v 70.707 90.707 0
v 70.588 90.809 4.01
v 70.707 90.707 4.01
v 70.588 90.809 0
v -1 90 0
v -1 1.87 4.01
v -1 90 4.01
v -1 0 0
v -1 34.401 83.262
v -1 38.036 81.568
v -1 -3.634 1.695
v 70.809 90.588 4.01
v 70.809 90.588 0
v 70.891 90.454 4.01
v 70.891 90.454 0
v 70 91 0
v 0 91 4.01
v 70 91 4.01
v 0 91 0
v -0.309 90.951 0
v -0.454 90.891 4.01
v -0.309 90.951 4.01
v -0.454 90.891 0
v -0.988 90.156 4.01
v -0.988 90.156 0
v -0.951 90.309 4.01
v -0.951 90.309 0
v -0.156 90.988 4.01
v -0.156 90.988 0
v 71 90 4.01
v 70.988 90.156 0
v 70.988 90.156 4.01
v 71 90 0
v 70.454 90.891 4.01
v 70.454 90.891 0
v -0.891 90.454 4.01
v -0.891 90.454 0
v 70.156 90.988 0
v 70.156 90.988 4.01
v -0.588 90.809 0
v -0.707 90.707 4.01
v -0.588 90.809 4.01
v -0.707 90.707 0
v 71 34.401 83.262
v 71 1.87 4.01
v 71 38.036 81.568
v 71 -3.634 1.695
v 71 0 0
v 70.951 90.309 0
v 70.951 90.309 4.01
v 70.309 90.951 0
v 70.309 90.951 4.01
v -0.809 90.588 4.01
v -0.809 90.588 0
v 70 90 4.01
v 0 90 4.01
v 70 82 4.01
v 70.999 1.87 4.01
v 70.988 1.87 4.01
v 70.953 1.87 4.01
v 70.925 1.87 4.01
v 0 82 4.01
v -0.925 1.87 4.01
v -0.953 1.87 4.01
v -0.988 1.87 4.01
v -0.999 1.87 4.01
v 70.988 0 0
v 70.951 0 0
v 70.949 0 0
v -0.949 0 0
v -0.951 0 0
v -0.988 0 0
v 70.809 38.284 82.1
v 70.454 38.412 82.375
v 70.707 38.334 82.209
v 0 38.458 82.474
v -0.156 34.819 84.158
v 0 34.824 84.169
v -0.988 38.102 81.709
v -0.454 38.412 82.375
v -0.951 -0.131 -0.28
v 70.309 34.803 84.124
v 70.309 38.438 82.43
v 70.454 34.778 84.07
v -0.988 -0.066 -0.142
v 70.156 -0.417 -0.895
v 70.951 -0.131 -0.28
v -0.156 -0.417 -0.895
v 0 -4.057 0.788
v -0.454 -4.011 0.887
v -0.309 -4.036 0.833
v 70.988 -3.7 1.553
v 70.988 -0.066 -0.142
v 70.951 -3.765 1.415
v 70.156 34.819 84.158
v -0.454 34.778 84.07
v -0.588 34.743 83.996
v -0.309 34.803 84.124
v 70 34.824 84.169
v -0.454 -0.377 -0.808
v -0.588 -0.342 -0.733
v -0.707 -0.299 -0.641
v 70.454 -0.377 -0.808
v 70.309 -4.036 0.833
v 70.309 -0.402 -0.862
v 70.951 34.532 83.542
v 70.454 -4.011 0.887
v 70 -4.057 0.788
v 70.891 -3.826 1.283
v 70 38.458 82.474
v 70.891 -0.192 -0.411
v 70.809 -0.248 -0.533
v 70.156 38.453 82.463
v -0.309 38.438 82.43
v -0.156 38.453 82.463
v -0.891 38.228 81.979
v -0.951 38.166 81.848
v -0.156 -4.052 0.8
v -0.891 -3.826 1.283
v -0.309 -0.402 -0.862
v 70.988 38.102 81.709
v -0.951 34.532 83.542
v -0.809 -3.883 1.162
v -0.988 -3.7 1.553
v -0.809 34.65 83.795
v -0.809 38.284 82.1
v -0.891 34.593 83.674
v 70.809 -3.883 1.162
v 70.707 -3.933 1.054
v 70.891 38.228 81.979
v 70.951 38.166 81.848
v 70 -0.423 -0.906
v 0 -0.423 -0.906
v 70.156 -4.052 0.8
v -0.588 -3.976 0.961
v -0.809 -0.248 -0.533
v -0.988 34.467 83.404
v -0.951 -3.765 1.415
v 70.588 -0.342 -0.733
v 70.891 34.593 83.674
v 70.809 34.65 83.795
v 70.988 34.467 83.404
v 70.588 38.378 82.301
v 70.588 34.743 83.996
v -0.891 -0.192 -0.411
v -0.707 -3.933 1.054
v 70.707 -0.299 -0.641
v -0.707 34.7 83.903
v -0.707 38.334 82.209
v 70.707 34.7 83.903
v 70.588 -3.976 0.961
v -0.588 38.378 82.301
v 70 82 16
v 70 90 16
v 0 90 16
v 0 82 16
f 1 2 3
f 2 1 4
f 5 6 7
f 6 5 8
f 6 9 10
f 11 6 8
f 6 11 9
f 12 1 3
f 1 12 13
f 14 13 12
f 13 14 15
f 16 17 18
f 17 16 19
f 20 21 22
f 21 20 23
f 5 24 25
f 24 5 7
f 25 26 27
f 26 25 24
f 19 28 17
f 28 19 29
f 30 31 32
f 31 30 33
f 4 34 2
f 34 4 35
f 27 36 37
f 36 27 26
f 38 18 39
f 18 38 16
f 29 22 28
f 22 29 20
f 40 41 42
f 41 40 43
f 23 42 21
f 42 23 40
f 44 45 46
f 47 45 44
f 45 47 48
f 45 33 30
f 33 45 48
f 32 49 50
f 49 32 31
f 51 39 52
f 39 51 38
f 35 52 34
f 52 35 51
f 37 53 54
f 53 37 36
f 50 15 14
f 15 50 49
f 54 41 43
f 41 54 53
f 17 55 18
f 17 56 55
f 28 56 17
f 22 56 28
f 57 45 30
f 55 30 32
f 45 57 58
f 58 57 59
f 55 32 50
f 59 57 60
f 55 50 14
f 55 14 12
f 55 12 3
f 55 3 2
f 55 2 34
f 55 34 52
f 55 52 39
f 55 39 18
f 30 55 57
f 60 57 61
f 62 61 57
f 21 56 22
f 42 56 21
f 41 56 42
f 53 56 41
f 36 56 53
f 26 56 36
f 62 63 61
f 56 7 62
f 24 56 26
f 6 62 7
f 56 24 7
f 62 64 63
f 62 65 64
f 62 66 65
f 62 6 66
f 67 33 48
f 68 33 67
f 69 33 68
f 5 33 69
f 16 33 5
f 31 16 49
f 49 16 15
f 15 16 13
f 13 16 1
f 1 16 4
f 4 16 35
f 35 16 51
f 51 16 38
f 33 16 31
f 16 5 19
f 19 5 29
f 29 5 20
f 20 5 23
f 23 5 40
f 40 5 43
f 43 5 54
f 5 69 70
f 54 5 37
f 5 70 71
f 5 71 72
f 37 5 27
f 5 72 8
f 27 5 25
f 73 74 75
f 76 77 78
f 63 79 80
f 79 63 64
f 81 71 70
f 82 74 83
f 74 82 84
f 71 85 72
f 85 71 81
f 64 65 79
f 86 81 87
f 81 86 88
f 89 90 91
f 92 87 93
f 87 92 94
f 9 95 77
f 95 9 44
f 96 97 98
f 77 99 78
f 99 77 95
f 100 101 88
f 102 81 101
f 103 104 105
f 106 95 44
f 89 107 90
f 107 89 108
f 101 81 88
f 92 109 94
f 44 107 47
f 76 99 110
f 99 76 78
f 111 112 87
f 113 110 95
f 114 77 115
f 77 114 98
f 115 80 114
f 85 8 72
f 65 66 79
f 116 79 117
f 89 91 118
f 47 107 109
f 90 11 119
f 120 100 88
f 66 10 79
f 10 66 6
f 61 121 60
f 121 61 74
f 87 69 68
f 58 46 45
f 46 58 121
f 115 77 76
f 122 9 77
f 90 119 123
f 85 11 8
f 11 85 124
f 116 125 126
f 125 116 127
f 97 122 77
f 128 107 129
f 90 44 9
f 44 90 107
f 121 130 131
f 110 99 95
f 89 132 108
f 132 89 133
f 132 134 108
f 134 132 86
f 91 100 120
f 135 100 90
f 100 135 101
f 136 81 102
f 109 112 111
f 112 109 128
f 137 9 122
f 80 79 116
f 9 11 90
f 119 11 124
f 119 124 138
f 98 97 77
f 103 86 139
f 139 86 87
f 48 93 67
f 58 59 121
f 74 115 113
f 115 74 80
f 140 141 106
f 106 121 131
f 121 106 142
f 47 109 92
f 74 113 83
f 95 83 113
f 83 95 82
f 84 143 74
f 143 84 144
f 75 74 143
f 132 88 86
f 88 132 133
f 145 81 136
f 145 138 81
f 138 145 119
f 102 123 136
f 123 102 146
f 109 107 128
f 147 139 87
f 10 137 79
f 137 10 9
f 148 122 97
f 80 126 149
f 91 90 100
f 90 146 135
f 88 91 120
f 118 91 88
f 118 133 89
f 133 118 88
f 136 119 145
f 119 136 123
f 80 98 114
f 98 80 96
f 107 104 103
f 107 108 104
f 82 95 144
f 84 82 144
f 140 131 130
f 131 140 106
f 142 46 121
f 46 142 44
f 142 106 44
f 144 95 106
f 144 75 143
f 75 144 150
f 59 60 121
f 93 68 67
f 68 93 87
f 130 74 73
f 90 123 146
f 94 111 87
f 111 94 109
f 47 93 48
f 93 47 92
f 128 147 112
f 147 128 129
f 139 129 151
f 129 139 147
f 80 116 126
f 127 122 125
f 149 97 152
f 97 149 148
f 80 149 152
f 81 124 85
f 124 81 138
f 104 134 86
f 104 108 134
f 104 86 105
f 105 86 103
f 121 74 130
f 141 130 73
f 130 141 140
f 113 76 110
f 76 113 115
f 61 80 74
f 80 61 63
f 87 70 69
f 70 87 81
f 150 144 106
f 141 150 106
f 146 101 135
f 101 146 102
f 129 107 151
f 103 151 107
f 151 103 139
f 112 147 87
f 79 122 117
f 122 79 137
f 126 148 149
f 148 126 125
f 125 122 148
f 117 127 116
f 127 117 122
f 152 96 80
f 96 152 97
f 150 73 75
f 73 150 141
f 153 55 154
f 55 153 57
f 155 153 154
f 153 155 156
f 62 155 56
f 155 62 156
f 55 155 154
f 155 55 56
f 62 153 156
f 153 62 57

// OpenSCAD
// 02parametricphonestand.scad
// Intermediate: Parametric phone stand
// Parameters
thickness = 4;        // mm
width = 70;           // mm
depth = 90;           // mm
angle = 65;           // degrees
lipheight = 12;      // mm
filletr = 6;         // mm (mock fillet by minkowski)

module plate(w, d, t){
  cube([w, d, t], center=false);
}

module fillet(shape, r){
  minkowski(){
    children();
    cylinder(h=0.01, r=r, $fn=40);
  }
}

// Back plate
module back(){
  rotate([angle,0,0])
    fillet(){ plate(width, depth, thickness); }
}

// Base
module base(){
  translate([0,0,0])
    fillet(){ plate(width, depth, thickness); }
}

// Lip
module lip(){
  translate([0, depth-8, thickness])
    cube([width, 8, lipheight], center=false);
}

union(){
  base();
  back();
  lip();
}
